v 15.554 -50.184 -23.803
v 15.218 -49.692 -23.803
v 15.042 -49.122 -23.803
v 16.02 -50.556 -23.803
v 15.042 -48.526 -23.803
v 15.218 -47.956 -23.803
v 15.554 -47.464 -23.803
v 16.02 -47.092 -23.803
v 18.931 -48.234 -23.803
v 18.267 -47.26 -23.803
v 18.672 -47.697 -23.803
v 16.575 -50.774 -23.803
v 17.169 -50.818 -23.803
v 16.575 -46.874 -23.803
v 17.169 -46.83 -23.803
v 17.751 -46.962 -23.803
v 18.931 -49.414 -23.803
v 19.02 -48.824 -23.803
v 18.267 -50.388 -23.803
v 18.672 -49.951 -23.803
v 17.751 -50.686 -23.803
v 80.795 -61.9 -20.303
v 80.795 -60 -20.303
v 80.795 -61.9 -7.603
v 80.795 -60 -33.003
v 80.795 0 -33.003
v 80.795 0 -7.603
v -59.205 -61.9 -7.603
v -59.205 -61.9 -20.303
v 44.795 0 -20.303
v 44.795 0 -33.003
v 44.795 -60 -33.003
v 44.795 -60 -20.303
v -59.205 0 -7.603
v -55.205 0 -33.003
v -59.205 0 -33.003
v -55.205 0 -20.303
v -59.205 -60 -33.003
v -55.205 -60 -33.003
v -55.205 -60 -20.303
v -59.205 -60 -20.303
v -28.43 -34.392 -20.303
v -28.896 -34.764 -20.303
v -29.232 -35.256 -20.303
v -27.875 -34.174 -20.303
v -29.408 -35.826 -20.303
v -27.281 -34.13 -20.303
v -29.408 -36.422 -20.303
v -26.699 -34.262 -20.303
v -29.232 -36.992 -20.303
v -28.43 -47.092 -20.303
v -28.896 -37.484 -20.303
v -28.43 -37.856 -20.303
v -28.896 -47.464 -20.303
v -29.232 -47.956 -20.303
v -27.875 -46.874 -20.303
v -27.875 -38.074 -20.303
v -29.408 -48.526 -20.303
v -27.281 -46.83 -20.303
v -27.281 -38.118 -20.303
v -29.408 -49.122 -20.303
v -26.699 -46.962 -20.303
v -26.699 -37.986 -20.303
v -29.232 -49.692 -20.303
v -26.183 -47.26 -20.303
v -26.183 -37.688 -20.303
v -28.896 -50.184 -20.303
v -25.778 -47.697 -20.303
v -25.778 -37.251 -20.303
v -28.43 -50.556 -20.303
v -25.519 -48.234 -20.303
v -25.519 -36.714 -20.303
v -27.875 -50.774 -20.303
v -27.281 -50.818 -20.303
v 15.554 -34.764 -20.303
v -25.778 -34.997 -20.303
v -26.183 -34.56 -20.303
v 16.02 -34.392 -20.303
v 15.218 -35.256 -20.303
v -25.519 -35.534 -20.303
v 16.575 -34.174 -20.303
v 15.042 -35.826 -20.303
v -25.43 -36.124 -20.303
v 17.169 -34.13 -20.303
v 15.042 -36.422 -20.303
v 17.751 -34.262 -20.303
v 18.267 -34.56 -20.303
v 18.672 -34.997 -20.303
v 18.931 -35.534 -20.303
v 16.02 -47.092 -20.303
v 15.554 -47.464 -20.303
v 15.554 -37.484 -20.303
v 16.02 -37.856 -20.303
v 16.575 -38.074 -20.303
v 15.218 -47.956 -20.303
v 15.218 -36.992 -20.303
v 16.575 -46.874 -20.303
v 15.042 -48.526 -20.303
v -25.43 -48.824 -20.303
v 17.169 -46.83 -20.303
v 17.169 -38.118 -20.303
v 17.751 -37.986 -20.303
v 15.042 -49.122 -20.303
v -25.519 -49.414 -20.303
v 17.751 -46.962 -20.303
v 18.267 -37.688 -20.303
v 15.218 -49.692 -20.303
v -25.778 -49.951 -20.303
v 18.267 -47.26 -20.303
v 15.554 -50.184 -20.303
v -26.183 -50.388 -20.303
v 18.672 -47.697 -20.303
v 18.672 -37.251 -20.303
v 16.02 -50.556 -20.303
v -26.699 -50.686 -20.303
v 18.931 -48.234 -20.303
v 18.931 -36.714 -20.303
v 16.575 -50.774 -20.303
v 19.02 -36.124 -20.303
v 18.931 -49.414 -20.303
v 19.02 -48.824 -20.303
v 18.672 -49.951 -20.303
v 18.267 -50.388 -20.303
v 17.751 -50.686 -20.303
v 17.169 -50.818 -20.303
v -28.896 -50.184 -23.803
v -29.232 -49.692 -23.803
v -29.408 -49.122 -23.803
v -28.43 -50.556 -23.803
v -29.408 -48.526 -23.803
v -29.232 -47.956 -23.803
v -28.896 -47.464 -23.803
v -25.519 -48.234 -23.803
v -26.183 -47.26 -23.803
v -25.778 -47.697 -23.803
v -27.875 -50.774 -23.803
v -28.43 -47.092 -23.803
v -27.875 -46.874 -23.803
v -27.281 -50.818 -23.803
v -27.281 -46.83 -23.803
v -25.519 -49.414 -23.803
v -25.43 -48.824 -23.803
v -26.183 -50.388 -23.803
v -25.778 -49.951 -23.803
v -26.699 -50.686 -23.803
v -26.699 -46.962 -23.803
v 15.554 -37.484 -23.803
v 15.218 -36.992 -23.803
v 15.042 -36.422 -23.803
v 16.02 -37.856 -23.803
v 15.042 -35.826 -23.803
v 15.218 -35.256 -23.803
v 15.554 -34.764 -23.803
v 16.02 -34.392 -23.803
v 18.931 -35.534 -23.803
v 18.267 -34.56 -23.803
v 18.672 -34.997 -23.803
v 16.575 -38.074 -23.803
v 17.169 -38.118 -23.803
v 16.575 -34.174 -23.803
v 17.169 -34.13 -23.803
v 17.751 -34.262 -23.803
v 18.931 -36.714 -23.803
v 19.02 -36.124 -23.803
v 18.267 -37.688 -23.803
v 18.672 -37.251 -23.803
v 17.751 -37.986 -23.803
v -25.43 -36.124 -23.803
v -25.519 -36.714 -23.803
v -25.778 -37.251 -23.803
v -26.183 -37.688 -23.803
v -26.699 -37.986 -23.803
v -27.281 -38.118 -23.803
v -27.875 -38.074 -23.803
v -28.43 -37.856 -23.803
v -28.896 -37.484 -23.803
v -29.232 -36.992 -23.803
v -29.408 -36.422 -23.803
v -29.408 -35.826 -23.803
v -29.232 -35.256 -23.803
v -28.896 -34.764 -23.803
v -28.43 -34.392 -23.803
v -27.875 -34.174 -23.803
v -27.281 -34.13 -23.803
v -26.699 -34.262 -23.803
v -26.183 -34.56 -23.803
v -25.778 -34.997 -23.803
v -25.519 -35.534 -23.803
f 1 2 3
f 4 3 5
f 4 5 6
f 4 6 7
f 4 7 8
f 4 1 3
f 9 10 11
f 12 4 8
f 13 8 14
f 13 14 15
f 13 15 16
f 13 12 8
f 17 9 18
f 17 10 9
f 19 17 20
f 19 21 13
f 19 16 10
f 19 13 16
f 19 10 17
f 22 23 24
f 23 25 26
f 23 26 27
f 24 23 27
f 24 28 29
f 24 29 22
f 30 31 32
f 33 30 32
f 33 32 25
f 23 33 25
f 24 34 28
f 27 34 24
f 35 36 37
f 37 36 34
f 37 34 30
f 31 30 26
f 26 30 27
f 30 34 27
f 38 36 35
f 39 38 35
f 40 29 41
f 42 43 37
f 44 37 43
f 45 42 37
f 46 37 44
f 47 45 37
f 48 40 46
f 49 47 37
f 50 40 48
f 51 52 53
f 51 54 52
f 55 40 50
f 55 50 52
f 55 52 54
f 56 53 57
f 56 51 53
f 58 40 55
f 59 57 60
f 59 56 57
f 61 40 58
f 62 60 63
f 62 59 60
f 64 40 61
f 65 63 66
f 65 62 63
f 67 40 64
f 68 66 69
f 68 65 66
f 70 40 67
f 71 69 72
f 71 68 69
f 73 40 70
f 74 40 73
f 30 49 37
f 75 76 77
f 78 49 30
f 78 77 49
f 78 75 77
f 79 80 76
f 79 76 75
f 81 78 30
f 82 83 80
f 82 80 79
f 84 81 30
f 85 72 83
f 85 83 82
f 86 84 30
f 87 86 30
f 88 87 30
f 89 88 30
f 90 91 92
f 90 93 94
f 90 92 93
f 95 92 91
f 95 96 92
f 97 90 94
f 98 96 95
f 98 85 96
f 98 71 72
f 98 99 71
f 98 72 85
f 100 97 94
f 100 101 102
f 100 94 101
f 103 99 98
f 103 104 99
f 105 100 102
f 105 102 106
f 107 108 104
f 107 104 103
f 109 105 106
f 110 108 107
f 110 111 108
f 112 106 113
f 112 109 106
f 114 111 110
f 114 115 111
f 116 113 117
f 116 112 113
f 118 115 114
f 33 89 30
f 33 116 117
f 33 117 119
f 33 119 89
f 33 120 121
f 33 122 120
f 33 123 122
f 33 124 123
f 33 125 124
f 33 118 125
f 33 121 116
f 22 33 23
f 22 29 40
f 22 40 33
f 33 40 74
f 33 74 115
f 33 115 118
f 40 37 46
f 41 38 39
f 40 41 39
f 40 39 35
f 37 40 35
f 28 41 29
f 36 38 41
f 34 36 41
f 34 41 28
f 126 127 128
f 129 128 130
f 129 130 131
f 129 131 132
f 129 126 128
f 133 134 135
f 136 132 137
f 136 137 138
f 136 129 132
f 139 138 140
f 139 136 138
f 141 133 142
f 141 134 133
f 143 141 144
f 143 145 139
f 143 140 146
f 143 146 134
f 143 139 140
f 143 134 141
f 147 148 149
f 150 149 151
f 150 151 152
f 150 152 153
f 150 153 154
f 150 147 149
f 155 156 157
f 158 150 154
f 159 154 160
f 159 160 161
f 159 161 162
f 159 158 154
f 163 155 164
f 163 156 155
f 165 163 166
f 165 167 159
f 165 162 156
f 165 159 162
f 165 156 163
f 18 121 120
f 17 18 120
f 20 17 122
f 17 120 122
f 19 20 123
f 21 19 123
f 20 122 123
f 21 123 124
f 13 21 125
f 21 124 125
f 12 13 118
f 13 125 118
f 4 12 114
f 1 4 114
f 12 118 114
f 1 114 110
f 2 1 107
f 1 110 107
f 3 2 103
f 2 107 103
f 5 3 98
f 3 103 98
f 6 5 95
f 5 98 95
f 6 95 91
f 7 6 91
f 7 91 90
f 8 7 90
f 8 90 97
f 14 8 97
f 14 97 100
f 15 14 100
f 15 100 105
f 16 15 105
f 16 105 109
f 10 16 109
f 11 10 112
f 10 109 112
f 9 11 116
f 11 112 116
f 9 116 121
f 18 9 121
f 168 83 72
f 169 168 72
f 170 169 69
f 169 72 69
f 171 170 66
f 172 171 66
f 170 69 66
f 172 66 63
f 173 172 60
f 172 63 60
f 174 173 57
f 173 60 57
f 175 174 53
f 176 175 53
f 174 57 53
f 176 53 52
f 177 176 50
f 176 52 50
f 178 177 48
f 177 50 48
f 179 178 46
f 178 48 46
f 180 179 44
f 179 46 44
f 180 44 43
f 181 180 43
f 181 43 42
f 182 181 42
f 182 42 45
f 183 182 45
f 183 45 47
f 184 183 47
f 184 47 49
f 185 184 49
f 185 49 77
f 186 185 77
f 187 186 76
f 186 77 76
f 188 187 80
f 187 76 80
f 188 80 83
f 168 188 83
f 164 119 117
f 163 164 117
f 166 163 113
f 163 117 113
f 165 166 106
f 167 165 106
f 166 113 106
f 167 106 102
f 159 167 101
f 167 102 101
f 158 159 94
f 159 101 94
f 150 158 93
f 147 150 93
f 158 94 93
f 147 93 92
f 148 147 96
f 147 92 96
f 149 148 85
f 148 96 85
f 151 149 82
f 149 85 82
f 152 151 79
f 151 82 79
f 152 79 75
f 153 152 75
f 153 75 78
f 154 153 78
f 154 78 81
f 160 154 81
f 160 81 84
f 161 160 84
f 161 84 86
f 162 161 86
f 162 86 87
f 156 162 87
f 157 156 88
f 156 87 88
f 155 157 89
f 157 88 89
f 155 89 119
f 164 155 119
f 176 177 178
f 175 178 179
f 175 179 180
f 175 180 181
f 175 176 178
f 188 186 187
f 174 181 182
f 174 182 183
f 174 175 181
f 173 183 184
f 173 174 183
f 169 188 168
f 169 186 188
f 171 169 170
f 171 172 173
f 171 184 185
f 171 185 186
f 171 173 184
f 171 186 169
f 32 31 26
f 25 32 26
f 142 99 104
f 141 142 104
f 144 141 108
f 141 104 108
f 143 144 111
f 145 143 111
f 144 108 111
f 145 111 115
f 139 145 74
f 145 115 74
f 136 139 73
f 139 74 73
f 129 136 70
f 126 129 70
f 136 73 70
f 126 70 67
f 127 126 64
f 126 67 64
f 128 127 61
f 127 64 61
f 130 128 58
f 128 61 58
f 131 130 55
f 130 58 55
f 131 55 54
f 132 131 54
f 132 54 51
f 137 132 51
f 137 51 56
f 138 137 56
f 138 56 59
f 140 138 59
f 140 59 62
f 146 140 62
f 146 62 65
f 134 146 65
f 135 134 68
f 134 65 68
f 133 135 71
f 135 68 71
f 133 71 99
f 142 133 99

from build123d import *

# Parameters (mm, degrees)
F0_W     = 140
F0_H     = 25.4
F1_DEPTH = 61.9
F3_DEPTH = 12.7
F4_R     = 2
F5_DEPTH = 3.5


with BuildPart() as f1:
    # F0 (on Front) → F1 (new body)
    with BuildSketch(Plane.XZ):
        with Locations((10.794906, -20.302821)):
            Rectangle(F0_W, F0_H)
    extrude(amount=F1_DEPTH)

    # F2 (on face) → F3 (cut)
    with BuildSketch(Plane(origin=(0, 0, -33.002821), x_dir=(1, 0, 0), z_dir=(0, 0, -1))):
        Polygon((-55.205094, 0), (44.794906, 0), (44.794906, 60), (80.794906, 60), (80.794906, 61.9), (-59.205094, 61.9), (-59.205094, 60), (-55.205094, 60), align=None)
    extrude(amount=-F3_DEPTH, mode=Mode.SUBTRACT)

    # F4 (on face) → F5 (join)
    with BuildSketch(Plane(origin=(0, 0, -20.302821), x_dir=(1, 0, 0), z_dir=(0, 0, -1))):
        with Locations((-27.430094, 48.824)):
            Circle(F4_R)
        with Locations((-27.430094, 36.124)):
            Circle(F4_R)
        with Locations((17.019906, 48.824)):
            Circle(F4_R)
        with Locations((17.019906, 36.124)):
            Circle(F4_R)
    extrude(amount=F5_DEPTH)


solid = f1.part
